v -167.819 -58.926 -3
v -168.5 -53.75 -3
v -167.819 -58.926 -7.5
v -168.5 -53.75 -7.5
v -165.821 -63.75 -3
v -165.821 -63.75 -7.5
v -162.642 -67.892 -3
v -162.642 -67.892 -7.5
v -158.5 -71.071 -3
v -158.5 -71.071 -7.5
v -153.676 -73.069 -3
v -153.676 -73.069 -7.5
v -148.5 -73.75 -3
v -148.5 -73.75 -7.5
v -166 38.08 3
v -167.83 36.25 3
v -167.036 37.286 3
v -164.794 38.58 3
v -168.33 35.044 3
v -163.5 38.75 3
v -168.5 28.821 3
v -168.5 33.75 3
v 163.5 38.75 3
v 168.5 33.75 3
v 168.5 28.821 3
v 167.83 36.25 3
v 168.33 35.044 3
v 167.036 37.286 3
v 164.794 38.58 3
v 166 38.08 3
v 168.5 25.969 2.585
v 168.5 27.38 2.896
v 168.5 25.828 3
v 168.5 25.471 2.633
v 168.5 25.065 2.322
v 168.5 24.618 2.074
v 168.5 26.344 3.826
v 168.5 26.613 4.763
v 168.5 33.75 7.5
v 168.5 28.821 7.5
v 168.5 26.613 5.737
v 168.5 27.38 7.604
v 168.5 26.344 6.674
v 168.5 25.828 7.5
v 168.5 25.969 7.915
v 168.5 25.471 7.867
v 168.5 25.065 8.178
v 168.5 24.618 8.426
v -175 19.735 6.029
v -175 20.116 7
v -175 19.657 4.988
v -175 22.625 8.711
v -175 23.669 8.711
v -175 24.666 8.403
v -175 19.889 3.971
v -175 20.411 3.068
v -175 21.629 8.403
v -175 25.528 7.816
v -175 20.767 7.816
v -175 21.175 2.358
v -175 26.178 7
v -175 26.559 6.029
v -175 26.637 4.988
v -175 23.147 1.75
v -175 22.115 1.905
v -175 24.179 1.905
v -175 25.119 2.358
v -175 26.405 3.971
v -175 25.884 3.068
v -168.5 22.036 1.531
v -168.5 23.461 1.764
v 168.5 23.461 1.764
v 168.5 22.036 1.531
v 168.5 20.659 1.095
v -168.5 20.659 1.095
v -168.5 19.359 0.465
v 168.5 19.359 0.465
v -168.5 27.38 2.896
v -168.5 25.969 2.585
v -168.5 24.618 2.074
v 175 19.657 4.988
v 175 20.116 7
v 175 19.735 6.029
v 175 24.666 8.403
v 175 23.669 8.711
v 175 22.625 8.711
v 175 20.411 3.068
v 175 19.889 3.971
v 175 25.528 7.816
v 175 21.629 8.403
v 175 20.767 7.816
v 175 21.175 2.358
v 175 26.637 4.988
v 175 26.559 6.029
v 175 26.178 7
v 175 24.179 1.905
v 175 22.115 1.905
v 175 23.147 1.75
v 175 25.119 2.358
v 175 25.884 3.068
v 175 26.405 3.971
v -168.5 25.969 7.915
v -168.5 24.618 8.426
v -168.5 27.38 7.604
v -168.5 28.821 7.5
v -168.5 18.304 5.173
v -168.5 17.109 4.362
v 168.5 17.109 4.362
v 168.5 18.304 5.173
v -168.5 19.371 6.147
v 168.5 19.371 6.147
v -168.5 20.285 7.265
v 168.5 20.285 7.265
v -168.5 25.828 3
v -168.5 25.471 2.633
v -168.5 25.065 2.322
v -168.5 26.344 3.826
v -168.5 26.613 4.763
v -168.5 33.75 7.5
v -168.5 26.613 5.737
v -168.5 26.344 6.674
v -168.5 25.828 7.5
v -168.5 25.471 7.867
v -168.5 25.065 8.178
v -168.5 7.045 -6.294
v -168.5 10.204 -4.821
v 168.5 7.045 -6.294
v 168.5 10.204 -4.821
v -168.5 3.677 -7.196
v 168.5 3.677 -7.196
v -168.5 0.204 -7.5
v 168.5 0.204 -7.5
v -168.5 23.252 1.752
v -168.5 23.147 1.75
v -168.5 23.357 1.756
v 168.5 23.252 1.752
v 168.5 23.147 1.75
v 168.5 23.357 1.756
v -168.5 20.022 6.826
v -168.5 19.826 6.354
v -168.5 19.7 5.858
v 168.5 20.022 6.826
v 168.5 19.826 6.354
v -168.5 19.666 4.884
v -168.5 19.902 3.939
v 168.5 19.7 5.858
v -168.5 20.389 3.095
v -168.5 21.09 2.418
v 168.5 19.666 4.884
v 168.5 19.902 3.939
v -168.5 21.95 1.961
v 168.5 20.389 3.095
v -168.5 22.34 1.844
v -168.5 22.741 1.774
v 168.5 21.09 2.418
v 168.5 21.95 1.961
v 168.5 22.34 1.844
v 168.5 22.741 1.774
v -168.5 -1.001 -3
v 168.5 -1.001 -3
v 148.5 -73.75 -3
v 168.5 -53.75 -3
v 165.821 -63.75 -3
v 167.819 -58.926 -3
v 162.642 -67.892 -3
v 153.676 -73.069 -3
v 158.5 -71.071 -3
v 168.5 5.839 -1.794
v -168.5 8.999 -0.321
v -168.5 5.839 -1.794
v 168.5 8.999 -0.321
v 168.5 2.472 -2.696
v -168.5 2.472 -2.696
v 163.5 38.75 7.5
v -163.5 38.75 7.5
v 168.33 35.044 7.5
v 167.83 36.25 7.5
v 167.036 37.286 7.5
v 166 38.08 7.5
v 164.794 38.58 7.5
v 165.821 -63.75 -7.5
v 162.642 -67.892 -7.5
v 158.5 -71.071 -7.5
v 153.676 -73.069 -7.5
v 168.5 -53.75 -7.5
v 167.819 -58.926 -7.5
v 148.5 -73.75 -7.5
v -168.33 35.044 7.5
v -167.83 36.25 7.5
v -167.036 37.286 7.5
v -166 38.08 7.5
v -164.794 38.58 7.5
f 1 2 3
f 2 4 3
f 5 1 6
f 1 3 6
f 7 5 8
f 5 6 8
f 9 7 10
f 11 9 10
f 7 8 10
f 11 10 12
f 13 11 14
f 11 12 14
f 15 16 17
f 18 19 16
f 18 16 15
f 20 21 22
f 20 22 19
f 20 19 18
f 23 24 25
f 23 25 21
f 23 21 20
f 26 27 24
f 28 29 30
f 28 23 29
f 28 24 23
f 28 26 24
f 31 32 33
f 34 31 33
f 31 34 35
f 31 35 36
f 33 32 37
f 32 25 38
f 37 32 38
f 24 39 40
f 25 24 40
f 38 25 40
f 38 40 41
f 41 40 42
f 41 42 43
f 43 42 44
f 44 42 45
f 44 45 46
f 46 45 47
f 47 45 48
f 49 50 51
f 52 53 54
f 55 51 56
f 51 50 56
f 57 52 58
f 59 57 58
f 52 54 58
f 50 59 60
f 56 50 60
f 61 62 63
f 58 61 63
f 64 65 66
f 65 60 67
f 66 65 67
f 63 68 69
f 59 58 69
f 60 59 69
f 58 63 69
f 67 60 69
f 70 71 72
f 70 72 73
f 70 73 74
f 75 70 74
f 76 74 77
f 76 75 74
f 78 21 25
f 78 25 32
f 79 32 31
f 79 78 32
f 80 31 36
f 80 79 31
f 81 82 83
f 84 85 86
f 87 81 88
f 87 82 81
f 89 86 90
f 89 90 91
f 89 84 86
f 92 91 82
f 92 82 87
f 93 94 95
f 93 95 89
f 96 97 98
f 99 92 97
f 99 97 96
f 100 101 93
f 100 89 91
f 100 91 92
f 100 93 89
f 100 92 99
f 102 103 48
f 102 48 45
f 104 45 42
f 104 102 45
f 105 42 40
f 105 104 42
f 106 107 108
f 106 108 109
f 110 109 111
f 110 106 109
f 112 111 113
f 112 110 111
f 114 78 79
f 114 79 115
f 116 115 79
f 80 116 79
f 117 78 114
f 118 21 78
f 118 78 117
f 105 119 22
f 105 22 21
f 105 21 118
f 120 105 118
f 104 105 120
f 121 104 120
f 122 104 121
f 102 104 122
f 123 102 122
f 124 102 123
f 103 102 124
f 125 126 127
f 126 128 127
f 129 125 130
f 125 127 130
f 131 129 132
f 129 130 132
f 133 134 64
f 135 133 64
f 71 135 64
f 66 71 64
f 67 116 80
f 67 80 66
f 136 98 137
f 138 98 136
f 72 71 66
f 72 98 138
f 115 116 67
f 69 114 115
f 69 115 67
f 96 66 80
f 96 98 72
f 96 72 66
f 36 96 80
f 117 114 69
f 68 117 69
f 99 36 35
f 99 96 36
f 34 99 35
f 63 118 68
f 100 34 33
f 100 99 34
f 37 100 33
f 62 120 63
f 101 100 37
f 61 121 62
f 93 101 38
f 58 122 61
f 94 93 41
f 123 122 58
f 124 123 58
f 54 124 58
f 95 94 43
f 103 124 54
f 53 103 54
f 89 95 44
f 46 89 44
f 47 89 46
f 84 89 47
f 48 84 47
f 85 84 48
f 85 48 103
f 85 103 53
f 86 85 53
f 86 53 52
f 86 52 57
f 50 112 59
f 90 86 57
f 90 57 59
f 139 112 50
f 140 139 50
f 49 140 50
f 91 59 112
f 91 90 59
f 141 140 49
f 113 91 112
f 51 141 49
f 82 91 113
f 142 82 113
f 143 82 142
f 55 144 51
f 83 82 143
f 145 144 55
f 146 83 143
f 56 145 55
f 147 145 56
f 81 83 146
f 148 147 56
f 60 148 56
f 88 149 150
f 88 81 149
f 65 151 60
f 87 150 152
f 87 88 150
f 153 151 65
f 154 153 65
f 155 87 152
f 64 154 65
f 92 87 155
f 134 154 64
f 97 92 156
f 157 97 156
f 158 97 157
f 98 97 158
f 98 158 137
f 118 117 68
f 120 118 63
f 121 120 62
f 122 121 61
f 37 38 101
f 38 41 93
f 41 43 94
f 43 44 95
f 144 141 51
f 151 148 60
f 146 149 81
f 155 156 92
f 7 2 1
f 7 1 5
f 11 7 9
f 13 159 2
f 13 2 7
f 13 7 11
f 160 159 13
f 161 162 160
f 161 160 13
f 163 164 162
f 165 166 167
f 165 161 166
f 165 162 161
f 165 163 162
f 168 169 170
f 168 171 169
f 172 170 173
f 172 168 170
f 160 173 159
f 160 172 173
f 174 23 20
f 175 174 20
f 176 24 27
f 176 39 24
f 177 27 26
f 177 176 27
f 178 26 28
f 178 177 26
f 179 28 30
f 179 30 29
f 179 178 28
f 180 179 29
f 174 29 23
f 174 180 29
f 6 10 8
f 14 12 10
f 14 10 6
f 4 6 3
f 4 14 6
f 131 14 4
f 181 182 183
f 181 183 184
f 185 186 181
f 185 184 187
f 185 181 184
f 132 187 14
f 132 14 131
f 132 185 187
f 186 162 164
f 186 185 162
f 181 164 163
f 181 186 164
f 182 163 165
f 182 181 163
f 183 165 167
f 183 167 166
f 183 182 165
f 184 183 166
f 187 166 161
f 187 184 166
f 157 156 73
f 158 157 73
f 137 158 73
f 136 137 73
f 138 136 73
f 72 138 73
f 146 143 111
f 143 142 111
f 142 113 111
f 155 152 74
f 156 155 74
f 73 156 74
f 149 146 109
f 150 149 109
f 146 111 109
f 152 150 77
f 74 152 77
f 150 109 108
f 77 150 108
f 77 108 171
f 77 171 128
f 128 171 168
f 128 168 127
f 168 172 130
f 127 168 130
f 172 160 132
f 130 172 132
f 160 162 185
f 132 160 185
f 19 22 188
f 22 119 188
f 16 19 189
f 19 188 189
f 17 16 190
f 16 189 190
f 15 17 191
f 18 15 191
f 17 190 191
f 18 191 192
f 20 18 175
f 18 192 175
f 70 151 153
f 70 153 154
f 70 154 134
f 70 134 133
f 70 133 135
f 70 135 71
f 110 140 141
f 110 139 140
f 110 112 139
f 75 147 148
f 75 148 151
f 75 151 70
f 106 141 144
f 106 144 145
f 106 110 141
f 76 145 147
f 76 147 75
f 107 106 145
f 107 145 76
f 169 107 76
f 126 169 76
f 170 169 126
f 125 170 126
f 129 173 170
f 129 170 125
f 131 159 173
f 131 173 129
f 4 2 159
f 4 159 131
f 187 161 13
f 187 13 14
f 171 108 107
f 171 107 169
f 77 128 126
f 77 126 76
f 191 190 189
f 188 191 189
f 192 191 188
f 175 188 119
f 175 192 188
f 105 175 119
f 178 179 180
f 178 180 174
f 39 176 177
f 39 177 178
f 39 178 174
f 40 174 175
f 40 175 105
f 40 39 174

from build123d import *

# Parameters (mm, degrees)
BOSS_EXTRUDE1_DEPTH = 168.5
SKETCH2_R           = 3.5
BOSS_EXTRUDE2_DEPTH = 175
FILLET1_R           = 20
SKETCH3_W           = 337
SKETCH3_H           = 35
CUT_EXTRUDE1_DEPTH  = 191.195458673
FILLET2_R           = 10
FILLET3_R           = 5


with BuildPart() as part:
    # Sketch1 → Boss-Extrude1 (new, symmetric)
    with BuildSketch(Plane(origin=(0, 0, 0), x_dir=(0, 0, -1), z_dir=(1, 0, 0))):
        Polygon((-7.5, 73.75), (-7.5, 22.544228634), (3, 4.357695155), (3, -73.75), (7.5, -73.75), (7.5, 5.563466521), (-3, 23.75), (-3, 73.75), align=None)
    extrude(amount=BOSS_EXTRUDE1_DEPTH, both=True)

    # Sketch2 → Boss-Extrude2 (add, symmetric)
    with BuildSketch(Plane(origin=(0, 0, 0), x_dir=(0, 0, -1), z_dir=(1, 0, 0))):
        with Locations((-5.25, 23.147114317)):
            Circle(SKETCH2_R)
    extrude(amount=BOSS_EXTRUDE2_DEPTH, both=True)

    # Fillet1
    fillet1_edges = [part.edges().sort_by_distance(p)[0] for p in [
        (-168.5, 73.75, 5.25),
        (0, 5.563466521, -7.5),
        (0, 4.357695155, -3),
        (168.5, -73.75, -5.25),
        (168.5, 73.75, 5.25),
        (-168.5, -73.75, -5.25),
    ]]
    fillet(fillet1_edges, radius=FILLET1_R)

    # Sketch3 → Cut-Extrude1 (cut, through all)
    with BuildSketch(Plane(origin=(0, 0, 3), x_dir=(-1, 0, 0), z_dir=(0, 0, -1))):
        with Locations((0, 56.25)):
            Rectangle(SKETCH3_W, SKETCH3_H)
    extrude(amount=-CUT_EXTRUDE1_DEPTH, mode=Mode.SUBTRACT)

    # Fillet2
    # the kernel refuses this fillet: 10 mm, written as the material it adds along each edge
    with BuildSketch(Plane(origin=(-168.5, 21.950342364, 1.96096718), x_dir=(0, 0.9916201681580873, -0.12918762364145653), z_dir=(1, 0, 0))) as fillet2_piece_1:
        with BuildLine():
            CenterArc((3.700369944, -9.760226866), FILLET2_R, 102.572148387, 24.85050234)
            Line((-2.376528536, -1.818482419), (0, 0))
            ThreePointArc((0, 0), (0.761840871, -0.083920597), (1.523681742, 0))
        make_face()
    extrude(amount=337)
    with BuildSketch(Plane(origin=(-168.5, 19.700342364, 5.858081497), x_dir=(0, 0.38393032015099443, 0.9233620683506307), z_dir=(1, 0, 0)), Plane(origin=(-168.5, 25.828065641, 3), x_dir=(0, -0.7941744447091721, -0.6076898480070884), z_dir=(1, 0, 0))) as fillet2_piece_2:
        with BuildLine():
            CenterArc((3.700369944, 9.760226866), FILLET2_R, 232.577349272, 24.85050234)
            Line((-2.376528536, 1.818482419), (0, 0))
            ThreePointArc((0, 0), (0.761840871, 0.083920597), (1.523681742, 0))
        make_face()
    extrude(amount=337)
    with BuildSketch(Plane(origin=(-168.5, 25.828065641, 7.5), x_dir=(0, 1, 0), z_dir=(1, 0, 0))) as fillet2_piece_3:
        with BuildLine():
            CenterArc((2.992451535, 10), FILLET2_R, 245.14949766, 24.85050234)
            ThreePointArc((-1.210069101, 0.925925926), (-0.554036856, 0.529610556), (0, 0))
            Line((0, 0), (2.992451535, 0))
        make_face()
    extrude(amount=337)

    # Fillet3
    fillet3_edges = [part.edges().sort_by_distance(p)[0] for p in [
        (-168.5, 38.75, 5.25),
        (168.5, 38.75, 5.25),
    ]]
    fillet(fillet3_edges, radius=FILLET3_R)


solid = part.part
